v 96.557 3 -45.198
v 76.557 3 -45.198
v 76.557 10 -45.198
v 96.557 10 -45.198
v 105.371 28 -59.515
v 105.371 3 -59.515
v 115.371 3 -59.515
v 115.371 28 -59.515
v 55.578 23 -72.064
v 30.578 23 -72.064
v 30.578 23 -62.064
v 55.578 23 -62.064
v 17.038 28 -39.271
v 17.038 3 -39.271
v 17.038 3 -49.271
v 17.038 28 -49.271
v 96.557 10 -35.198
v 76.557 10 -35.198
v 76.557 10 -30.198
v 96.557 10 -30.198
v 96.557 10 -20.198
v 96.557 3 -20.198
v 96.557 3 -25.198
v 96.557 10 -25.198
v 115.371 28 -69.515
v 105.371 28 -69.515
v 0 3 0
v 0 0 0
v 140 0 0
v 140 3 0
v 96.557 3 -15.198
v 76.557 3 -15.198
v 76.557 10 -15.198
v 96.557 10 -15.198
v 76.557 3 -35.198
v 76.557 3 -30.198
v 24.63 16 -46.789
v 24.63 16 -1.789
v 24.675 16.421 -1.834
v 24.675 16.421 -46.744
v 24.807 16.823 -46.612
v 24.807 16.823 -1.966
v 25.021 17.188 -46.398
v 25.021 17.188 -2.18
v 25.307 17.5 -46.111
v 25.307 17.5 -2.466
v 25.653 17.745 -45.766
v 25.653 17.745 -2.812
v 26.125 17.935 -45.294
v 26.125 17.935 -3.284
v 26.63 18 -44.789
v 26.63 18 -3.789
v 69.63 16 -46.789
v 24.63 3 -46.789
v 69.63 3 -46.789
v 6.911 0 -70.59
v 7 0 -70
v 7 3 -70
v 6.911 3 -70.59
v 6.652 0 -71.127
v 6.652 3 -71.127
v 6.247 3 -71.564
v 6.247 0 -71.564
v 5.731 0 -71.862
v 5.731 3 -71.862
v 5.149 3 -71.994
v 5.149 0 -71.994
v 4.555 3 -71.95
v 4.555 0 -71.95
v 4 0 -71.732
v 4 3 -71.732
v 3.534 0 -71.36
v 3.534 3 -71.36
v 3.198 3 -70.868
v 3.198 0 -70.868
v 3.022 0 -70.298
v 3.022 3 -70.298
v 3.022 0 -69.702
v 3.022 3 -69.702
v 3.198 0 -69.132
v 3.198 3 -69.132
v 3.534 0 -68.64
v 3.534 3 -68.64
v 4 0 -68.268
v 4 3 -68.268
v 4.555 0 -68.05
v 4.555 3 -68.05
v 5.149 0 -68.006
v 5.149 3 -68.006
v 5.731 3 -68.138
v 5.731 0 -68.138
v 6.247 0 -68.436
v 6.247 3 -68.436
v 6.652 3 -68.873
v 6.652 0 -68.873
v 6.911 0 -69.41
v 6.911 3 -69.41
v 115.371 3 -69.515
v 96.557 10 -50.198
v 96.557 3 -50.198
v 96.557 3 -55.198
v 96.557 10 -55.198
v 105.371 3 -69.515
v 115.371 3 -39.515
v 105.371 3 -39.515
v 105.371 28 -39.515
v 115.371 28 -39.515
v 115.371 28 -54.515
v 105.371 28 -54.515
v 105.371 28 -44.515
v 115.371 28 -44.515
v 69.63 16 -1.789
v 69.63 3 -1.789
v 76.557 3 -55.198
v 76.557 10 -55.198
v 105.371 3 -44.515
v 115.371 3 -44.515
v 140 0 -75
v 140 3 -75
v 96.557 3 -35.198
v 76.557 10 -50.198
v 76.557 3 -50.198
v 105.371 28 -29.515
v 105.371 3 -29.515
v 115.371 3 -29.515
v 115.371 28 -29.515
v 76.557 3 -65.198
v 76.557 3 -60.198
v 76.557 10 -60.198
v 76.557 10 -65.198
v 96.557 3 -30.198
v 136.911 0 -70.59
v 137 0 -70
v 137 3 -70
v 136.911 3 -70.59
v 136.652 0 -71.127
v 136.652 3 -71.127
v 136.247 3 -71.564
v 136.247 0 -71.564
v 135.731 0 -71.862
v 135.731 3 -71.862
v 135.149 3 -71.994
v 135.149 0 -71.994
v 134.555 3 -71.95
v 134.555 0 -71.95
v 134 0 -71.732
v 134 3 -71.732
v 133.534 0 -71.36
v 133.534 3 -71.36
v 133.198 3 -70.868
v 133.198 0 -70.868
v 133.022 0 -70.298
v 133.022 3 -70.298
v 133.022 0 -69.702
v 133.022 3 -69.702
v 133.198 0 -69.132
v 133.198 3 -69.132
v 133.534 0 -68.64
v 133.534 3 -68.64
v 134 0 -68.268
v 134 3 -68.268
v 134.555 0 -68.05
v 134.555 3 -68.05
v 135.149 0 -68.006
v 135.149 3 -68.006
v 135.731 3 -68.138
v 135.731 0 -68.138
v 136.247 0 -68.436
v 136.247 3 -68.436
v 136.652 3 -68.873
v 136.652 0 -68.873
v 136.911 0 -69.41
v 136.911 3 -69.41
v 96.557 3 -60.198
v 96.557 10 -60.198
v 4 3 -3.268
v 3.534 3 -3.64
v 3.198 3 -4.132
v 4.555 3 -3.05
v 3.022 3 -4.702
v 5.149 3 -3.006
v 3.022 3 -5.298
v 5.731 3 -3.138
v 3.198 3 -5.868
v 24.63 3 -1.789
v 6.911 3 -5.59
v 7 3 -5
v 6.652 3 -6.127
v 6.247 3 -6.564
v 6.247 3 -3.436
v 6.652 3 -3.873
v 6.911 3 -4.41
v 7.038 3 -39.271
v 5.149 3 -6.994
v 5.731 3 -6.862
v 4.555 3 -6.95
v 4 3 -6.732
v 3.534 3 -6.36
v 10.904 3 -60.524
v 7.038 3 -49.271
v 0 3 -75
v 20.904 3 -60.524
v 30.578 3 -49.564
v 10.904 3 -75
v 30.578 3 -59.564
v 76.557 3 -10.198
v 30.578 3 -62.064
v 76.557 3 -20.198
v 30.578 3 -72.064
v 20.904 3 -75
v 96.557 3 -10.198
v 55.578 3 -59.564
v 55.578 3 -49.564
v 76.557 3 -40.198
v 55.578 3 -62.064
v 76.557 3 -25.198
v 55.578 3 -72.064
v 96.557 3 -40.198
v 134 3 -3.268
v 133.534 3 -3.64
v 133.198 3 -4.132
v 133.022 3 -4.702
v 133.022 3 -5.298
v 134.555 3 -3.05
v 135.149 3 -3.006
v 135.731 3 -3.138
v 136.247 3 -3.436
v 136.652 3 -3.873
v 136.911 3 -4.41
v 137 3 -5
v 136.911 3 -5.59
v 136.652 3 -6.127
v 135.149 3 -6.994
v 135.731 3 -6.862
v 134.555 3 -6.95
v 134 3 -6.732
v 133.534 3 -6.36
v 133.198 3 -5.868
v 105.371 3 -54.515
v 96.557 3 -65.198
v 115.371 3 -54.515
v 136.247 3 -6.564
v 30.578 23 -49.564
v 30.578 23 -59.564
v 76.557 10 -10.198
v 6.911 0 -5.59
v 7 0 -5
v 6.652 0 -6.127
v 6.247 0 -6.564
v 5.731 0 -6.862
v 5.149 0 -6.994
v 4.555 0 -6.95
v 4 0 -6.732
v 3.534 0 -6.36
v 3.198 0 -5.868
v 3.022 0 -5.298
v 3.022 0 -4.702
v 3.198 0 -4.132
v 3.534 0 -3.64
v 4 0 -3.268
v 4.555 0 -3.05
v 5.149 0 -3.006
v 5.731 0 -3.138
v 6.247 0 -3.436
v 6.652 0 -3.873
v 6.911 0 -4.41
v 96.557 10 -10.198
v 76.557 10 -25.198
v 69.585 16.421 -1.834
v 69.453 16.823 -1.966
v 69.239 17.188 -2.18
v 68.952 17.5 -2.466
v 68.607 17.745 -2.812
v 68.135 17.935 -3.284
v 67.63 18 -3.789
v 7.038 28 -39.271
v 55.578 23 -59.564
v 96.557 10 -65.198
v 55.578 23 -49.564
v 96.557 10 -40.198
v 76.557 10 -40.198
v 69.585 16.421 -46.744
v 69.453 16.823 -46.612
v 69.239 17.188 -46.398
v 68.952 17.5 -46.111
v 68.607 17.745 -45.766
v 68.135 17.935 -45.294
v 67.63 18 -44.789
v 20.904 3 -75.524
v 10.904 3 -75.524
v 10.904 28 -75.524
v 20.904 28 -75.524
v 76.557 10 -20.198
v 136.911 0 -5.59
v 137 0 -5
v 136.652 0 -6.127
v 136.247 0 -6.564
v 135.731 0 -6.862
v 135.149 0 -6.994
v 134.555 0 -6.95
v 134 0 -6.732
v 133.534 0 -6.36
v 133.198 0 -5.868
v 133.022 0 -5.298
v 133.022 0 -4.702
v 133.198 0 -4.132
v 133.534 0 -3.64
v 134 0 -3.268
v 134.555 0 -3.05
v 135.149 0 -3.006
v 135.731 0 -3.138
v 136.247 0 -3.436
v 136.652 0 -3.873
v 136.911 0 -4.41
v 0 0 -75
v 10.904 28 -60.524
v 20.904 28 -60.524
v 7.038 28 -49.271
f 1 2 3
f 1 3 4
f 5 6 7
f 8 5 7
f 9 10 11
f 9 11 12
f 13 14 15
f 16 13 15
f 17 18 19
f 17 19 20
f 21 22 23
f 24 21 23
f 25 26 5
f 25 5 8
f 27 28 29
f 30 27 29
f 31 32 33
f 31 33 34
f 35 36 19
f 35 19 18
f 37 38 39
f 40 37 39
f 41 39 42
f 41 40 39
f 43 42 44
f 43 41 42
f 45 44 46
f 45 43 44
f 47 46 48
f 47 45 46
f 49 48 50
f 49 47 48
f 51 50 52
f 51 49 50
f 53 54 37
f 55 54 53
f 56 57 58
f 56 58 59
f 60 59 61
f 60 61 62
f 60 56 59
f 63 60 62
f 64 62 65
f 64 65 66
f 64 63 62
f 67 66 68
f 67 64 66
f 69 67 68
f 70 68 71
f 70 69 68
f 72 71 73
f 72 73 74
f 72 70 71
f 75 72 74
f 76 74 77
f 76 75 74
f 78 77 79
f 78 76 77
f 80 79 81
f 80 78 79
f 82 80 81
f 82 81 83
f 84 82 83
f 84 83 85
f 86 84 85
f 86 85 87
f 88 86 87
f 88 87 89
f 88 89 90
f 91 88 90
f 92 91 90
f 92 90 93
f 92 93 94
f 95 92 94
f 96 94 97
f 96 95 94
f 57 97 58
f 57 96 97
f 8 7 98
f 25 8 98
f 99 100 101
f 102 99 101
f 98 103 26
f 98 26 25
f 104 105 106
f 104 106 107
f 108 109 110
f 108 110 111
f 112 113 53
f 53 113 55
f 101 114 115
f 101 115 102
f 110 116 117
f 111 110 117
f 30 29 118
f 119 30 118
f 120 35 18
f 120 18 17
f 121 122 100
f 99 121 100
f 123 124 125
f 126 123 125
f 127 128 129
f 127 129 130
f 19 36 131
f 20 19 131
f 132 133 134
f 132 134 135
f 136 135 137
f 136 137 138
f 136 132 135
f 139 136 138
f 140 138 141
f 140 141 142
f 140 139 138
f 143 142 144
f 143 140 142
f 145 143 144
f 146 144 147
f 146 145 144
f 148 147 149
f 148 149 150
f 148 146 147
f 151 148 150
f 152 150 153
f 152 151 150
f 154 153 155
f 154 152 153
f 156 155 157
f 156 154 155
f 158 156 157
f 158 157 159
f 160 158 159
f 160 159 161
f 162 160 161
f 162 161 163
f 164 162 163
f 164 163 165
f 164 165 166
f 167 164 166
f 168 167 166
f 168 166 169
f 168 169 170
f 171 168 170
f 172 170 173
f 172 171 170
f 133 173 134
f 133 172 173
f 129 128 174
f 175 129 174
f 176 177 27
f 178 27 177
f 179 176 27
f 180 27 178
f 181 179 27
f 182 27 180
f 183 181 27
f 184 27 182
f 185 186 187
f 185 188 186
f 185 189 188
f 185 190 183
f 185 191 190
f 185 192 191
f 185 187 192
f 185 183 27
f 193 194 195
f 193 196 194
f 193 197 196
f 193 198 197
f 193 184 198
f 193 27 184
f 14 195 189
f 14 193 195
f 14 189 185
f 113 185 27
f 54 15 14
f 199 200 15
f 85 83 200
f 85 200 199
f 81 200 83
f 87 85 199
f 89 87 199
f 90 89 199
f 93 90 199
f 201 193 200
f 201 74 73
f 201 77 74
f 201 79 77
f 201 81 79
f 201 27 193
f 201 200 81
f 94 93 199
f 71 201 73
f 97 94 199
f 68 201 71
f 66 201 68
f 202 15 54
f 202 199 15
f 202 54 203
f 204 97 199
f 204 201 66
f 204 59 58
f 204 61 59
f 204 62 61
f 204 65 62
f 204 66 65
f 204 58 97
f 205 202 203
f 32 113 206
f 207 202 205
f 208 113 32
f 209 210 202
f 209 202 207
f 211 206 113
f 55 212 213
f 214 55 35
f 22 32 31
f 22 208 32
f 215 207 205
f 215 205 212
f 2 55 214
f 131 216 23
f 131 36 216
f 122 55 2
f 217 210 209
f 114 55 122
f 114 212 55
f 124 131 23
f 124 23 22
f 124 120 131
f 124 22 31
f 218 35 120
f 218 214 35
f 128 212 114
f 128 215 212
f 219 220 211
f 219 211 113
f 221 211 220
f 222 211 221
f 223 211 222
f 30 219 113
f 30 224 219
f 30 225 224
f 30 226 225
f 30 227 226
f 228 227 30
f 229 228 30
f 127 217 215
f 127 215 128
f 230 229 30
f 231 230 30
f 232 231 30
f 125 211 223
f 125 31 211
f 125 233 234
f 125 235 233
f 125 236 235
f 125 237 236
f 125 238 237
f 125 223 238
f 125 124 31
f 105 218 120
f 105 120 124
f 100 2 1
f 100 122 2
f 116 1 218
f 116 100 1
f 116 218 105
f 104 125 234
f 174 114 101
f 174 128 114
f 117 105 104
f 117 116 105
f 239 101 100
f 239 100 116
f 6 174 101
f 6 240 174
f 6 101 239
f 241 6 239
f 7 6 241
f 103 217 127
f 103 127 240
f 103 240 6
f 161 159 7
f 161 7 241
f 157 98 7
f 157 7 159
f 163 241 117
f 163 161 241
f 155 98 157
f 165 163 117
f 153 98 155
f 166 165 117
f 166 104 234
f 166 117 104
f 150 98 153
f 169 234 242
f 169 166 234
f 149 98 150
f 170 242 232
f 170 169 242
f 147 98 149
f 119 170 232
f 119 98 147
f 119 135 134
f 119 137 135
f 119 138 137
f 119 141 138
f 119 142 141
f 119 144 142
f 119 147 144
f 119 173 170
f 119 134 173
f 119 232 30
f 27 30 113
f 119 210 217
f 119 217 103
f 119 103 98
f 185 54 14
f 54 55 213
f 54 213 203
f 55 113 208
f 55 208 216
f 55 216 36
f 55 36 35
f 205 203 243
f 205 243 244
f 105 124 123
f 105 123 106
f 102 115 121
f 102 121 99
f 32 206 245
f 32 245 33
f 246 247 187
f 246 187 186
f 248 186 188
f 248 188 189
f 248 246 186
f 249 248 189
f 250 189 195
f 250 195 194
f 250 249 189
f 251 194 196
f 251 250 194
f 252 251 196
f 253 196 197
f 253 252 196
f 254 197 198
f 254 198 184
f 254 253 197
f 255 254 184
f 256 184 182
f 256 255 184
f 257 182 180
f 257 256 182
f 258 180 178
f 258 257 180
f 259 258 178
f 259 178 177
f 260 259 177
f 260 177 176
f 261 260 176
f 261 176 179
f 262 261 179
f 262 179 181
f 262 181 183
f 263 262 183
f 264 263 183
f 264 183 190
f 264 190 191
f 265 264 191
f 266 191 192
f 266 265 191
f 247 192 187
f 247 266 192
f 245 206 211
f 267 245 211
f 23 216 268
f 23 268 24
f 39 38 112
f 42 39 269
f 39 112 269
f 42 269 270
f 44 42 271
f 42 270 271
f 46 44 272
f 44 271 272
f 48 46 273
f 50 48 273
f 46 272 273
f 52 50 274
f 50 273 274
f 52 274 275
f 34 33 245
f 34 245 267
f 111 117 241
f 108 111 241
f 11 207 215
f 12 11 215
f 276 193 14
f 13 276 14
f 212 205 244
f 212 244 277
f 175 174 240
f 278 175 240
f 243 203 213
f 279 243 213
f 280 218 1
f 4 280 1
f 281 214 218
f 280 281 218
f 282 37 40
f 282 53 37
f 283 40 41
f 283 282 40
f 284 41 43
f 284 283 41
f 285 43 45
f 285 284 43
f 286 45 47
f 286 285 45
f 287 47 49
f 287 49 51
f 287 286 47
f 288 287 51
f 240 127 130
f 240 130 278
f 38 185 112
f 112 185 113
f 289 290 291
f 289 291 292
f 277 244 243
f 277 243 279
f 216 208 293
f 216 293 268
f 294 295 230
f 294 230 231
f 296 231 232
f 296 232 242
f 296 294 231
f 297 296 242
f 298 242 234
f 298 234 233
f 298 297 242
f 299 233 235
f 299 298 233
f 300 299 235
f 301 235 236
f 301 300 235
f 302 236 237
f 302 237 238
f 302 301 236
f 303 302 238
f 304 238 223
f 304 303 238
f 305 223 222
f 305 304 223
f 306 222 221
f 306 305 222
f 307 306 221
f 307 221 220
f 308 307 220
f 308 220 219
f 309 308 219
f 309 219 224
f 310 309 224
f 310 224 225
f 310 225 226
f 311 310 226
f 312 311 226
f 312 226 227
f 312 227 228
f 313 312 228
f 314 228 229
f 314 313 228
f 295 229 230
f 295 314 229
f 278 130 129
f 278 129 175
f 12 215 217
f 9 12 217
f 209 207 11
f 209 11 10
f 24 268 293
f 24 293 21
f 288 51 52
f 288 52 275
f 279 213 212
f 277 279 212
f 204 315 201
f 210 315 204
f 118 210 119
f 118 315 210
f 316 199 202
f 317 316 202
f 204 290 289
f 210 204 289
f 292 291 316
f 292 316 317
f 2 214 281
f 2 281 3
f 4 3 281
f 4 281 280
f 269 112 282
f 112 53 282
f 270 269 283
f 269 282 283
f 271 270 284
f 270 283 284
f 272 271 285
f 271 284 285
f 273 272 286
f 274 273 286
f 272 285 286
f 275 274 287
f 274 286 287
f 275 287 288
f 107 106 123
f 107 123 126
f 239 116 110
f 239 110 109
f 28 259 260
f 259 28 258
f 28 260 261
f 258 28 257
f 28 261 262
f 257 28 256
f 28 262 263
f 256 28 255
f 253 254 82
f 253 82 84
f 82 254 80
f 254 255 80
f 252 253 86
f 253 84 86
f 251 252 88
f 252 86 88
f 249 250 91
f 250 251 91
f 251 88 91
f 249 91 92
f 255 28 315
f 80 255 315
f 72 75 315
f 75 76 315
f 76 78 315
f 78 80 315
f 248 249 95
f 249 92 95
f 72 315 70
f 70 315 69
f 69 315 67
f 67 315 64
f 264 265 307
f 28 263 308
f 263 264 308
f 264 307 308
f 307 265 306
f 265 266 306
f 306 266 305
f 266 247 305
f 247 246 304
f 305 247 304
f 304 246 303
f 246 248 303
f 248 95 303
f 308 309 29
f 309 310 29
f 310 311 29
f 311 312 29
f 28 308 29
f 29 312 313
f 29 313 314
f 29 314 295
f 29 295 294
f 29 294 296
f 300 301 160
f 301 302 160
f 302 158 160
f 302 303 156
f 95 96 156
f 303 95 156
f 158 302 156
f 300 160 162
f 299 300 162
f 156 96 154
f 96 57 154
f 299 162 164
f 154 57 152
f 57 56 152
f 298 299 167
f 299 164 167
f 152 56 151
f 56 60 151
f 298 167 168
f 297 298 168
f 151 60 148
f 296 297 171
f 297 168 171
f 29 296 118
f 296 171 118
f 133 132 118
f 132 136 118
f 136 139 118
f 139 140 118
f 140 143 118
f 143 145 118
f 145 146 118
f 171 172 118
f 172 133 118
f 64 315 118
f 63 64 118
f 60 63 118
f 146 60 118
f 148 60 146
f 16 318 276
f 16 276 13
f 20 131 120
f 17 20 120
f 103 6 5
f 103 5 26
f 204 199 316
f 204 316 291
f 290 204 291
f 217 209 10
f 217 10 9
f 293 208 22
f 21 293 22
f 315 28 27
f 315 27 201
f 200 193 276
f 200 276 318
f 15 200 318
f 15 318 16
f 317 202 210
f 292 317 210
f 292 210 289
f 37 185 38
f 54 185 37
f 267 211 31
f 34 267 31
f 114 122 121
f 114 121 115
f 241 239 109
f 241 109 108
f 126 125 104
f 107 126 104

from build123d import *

# Parameters (mm, degrees)
ESQUISSE1_W      = 140
ESQUISSE1_H      = 75
ESQUISSE1_R      = 2
EXTRUSION1_DEPTH = 3
ESQUISSE2_W      = 45
ESQUISSE2_H      = 45
EXTRUSION2_DEPTH = 15
CONG_1_R         = 2
ESQUISSE3_W      = 10
ESQUISSE3_H      = 10
EXTRUSION3_DEPTH = 25
ESQUISSE4_W      = 25
ESQUISSE4_H      = 10
EXTRUSION4_DEPTH = 20
ESQUISSE5_W      = 20
ESQUISSE5_H      = 5
EXTRUSION5_DEPTH = 7
ESQUISSE6_W      = 10
ESQUISSE6_H      = 15
EXTRUSION6_DEPTH = 25


with BuildPart() as part:
    # Esquisse1 → Extrusion1 (new body)
    with BuildSketch(Plane(origin=(0, 0, 0), x_dir=(1, 0, 0), z_dir=(0, 1, 0))):
        with Locations((70, 37.5)):
            Rectangle(ESQUISSE1_W, ESQUISSE1_H)
        with Locations((5, 70)):
            Circle(ESQUISSE1_R, mode=Mode.SUBTRACT)
        with Locations((135, 70)):
            Circle(ESQUISSE1_R, mode=Mode.SUBTRACT)
        with Locations((135, 5)):
            Circle(ESQUISSE1_R, mode=Mode.SUBTRACT)
        with Locations((5, 5)):
            Circle(ESQUISSE1_R, mode=Mode.SUBTRACT)
    extrude(amount=EXTRUSION1_DEPTH)

    # Esquisse2 → Extrusion2 (add)
    with BuildSketch(Plane(origin=(0, 3, 0), x_dir=(1, 0, 0), z_dir=(0, 1, 0))):
        with Locations((47.129827859, 24.288749044)):
            Rectangle(ESQUISSE2_W, ESQUISSE2_H)
    extrude(amount=EXTRUSION2_DEPTH)

    # Congé1
    cong_1_edges = [part.edges().sort_by_distance(p)[0] for p in [
        (24.629827859, 18, -24.288749044),
        (47.129827859, 18, -1.788749044),
        (69.629827859, 18, -24.288749044),
        (47.129827859, 18, -46.788749044),
    ]]
    fillet(cong_1_edges, radius=CONG_1_R)

    # Esquisse3 → Extrusion3 (add)
    with BuildSketch(Plane(origin=(0, 3, 0), x_dir=(1, 0, 0), z_dir=(0, 1, 0))):
        with Locations((110.370603903, 64.515282671)):
            Rectangle(ESQUISSE3_W, ESQUISSE3_H)
        with Locations((12.038471753, 44.271083815)):
            Rectangle(ESQUISSE3_W, ESQUISSE3_H)
        with Locations((110.370603903, 49.515282671)):
            Rectangle(ESQUISSE3_W, ESQUISSE3_H)
        with Locations((110.370603903, 34.515282671)):
            Rectangle(ESQUISSE3_W, ESQUISSE3_H)
    extrude(amount=EXTRUSION3_DEPTH)

    # Esquisse4 → Extrusion4 (add)
    with BuildSketch(Plane(origin=(0, 3, 0), x_dir=(1, 0, 0), z_dir=(0, 1, 0))):
        with Locations((43.077660713, 67.06403932)):
            Rectangle(ESQUISSE4_W, ESQUISSE4_H)
        with Locations((43.077660713, 54.56403932)):
            Rectangle(ESQUISSE4_W, ESQUISSE4_H)
    extrude(amount=EXTRUSION4_DEPTH)

    # Esquisse5 → Extrusion5 (add)
    with BuildSketch(Plane(origin=(0, 3, 0), x_dir=(1, 0, 0), z_dir=(0, 1, 0))):
        with Locations((86.557419786, 62.697517929)):
            Rectangle(ESQUISSE5_W, ESQUISSE5_H)
        with Locations((86.557419786, 52.697517929)):
            Rectangle(ESQUISSE5_W, ESQUISSE5_H)
        with Locations((86.557419786, 42.697517929)):
            Rectangle(ESQUISSE5_W, ESQUISSE5_H)
        with Locations((86.557419786, 32.697517929)):
            Rectangle(ESQUISSE5_W, ESQUISSE5_H)
        with Locations((86.557419786, 22.697517929)):
            Rectangle(ESQUISSE5_W, ESQUISSE5_H)
        with Locations((86.557419786, 12.697517929)):
            Rectangle(ESQUISSE5_W, ESQUISSE5_H)
    extrude(amount=EXTRUSION5_DEPTH)

    # Esquisse6 → Extrusion6 (add)
    with BuildSketch(Plane(origin=(0, 3, 0), x_dir=(1, 0, 0), z_dir=(0, 1, 0))):
        with Locations((15.904188898, 68.024450773)):
            Rectangle(ESQUISSE6_W, ESQUISSE6_H)
    extrude(amount=EXTRUSION6_DEPTH)


solid = part.part
